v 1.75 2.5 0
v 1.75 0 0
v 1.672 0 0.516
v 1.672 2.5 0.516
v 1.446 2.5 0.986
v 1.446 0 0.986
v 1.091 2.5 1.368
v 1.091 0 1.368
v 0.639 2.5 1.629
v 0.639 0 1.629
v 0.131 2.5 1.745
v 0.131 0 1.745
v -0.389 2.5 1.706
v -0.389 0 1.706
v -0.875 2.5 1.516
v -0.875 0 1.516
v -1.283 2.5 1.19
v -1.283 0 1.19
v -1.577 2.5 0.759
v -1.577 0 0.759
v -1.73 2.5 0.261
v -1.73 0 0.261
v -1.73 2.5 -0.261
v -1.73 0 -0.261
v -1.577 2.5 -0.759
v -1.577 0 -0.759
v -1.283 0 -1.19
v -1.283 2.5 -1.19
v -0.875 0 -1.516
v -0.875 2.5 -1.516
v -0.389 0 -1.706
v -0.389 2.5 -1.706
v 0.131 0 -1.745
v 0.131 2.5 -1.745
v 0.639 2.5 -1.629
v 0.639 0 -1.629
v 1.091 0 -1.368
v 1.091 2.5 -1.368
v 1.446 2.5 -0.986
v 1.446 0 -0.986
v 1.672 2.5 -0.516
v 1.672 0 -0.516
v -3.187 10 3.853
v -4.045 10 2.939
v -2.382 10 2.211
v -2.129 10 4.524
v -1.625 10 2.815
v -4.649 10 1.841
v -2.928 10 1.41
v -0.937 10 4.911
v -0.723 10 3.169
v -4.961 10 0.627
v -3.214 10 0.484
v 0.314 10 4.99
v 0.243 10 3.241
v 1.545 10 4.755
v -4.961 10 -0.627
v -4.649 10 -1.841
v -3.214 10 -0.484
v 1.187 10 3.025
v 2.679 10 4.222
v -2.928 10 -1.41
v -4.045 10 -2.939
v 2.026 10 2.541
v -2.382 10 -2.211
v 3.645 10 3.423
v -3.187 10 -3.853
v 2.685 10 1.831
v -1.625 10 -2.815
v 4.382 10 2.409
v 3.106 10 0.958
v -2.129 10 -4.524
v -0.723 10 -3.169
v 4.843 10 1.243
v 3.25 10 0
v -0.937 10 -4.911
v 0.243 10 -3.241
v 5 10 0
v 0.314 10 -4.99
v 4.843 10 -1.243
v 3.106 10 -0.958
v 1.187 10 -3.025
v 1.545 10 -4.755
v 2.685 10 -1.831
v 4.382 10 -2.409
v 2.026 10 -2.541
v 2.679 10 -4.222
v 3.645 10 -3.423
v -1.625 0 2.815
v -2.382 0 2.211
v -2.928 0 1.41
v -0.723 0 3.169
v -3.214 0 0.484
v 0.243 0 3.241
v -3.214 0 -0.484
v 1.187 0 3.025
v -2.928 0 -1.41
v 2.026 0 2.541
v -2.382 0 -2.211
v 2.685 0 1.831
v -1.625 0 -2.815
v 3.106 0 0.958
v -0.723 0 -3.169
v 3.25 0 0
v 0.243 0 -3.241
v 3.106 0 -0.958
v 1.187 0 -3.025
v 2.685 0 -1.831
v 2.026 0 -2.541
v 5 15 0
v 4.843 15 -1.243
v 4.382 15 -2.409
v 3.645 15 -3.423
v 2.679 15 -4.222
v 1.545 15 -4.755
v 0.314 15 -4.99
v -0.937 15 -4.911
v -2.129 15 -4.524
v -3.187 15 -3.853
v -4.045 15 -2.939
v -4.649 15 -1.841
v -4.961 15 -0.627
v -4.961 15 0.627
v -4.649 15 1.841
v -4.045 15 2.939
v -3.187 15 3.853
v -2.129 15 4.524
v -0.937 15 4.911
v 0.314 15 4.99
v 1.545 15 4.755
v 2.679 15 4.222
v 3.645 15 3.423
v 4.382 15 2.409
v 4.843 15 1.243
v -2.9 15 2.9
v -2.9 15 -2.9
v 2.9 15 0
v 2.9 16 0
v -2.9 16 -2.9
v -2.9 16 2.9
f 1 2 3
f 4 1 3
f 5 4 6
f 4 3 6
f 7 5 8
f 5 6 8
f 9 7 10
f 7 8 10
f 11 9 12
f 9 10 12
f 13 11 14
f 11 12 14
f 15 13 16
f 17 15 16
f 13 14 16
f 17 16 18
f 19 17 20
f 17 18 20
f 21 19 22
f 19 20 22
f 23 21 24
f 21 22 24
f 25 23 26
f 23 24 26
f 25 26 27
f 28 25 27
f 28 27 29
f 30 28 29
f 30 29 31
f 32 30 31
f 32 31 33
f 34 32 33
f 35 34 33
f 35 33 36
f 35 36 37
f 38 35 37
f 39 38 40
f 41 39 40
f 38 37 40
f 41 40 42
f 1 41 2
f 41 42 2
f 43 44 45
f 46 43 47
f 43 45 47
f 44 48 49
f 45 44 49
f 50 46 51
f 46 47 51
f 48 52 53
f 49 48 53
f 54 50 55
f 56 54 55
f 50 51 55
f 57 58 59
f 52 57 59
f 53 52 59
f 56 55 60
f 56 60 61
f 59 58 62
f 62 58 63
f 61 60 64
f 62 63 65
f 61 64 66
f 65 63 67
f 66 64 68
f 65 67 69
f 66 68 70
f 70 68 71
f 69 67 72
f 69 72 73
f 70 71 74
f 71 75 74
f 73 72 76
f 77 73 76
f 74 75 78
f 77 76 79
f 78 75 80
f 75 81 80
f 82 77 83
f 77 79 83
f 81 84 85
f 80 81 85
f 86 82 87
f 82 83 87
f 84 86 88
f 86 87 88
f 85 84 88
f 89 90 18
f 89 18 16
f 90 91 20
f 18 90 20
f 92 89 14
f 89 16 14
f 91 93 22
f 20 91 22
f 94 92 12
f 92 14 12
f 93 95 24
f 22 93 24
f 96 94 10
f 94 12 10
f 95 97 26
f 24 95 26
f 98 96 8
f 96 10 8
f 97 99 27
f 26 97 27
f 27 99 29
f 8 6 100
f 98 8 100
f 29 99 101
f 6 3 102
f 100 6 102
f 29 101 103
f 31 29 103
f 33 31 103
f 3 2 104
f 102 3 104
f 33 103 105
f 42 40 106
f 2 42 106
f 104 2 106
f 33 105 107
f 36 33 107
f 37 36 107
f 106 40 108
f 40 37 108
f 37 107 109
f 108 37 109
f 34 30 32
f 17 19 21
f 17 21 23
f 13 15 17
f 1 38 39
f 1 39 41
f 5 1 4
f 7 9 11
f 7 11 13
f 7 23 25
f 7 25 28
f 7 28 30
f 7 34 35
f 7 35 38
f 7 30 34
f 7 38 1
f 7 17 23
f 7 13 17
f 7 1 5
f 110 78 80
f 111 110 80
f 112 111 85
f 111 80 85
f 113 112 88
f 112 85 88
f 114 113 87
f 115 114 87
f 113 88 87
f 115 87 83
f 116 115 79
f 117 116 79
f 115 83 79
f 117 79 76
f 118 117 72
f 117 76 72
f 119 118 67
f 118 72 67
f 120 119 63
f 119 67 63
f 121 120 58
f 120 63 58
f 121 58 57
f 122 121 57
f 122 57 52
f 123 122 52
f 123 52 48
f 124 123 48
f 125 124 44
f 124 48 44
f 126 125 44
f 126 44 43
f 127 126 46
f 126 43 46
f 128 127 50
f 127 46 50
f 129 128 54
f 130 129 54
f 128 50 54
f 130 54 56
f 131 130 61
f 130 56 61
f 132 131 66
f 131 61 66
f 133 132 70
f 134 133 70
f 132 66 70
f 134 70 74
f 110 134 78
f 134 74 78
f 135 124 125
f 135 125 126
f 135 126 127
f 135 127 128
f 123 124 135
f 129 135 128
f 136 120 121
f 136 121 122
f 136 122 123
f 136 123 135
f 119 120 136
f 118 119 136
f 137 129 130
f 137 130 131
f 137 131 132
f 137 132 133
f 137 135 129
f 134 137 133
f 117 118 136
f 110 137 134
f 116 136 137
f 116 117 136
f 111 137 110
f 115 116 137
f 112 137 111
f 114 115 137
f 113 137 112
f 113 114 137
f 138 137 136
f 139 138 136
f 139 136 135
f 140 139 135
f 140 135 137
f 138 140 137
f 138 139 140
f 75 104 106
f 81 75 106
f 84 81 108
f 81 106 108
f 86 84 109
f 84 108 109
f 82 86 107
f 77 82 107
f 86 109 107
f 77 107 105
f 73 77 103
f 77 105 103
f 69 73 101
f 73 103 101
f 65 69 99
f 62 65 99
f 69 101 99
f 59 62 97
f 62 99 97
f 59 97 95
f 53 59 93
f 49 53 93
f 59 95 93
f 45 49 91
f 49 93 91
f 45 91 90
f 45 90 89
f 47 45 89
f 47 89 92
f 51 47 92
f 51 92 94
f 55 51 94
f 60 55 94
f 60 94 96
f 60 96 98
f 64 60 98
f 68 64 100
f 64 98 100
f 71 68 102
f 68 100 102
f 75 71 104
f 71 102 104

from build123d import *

# Parameters (mm, degrees)
SKETCH1_R           = 3.25
BOSS_EXTRUDE1_DEPTH = 10
SKETCH2_R           = 1.75
CUT_EXTRUDE1_DEPTH  = 2.5
SKETCH6_R           = 5
BOSS_EXTRUDE2_DEPTH = 5
BOSS_EXTRUDE3_DEPTH = 1


with BuildPart() as part:
    # Sketch1 → Boss-Extrude1 (new body)
    with BuildSketch(Plane(origin=(0, 0, 0), x_dir=(1, 0, 0), z_dir=(0, 1, 0))):
        Circle(SKETCH1_R)
    extrude(amount=BOSS_EXTRUDE1_DEPTH)

    # Sketch2 → Cut-Extrude1 (cut)
    with BuildSketch(Plane.XZ):
        Circle(SKETCH2_R)
    extrude(amount=-CUT_EXTRUDE1_DEPTH, mode=Mode.SUBTRACT)

    # Sketch6 → Boss-Extrude2 (add)
    with BuildSketch(Plane(origin=(0, 10, 0), x_dir=(1, 0, 0), z_dir=(0, 1, 0))):
        Circle(SKETCH6_R)
    extrude(amount=BOSS_EXTRUDE2_DEPTH)

    # Sketch9 → Boss-Extrude3 (add)
    with BuildSketch(Plane(origin=(0, 15, 0), x_dir=(1, 0, 0), z_dir=(0, 1, 0))):
        Polygon((-2.9, 2.9), (-2.9, -2.9), (2.9, 0), align=None)
    extrude(amount=BOSS_EXTRUDE3_DEPTH)


solid = part.part
